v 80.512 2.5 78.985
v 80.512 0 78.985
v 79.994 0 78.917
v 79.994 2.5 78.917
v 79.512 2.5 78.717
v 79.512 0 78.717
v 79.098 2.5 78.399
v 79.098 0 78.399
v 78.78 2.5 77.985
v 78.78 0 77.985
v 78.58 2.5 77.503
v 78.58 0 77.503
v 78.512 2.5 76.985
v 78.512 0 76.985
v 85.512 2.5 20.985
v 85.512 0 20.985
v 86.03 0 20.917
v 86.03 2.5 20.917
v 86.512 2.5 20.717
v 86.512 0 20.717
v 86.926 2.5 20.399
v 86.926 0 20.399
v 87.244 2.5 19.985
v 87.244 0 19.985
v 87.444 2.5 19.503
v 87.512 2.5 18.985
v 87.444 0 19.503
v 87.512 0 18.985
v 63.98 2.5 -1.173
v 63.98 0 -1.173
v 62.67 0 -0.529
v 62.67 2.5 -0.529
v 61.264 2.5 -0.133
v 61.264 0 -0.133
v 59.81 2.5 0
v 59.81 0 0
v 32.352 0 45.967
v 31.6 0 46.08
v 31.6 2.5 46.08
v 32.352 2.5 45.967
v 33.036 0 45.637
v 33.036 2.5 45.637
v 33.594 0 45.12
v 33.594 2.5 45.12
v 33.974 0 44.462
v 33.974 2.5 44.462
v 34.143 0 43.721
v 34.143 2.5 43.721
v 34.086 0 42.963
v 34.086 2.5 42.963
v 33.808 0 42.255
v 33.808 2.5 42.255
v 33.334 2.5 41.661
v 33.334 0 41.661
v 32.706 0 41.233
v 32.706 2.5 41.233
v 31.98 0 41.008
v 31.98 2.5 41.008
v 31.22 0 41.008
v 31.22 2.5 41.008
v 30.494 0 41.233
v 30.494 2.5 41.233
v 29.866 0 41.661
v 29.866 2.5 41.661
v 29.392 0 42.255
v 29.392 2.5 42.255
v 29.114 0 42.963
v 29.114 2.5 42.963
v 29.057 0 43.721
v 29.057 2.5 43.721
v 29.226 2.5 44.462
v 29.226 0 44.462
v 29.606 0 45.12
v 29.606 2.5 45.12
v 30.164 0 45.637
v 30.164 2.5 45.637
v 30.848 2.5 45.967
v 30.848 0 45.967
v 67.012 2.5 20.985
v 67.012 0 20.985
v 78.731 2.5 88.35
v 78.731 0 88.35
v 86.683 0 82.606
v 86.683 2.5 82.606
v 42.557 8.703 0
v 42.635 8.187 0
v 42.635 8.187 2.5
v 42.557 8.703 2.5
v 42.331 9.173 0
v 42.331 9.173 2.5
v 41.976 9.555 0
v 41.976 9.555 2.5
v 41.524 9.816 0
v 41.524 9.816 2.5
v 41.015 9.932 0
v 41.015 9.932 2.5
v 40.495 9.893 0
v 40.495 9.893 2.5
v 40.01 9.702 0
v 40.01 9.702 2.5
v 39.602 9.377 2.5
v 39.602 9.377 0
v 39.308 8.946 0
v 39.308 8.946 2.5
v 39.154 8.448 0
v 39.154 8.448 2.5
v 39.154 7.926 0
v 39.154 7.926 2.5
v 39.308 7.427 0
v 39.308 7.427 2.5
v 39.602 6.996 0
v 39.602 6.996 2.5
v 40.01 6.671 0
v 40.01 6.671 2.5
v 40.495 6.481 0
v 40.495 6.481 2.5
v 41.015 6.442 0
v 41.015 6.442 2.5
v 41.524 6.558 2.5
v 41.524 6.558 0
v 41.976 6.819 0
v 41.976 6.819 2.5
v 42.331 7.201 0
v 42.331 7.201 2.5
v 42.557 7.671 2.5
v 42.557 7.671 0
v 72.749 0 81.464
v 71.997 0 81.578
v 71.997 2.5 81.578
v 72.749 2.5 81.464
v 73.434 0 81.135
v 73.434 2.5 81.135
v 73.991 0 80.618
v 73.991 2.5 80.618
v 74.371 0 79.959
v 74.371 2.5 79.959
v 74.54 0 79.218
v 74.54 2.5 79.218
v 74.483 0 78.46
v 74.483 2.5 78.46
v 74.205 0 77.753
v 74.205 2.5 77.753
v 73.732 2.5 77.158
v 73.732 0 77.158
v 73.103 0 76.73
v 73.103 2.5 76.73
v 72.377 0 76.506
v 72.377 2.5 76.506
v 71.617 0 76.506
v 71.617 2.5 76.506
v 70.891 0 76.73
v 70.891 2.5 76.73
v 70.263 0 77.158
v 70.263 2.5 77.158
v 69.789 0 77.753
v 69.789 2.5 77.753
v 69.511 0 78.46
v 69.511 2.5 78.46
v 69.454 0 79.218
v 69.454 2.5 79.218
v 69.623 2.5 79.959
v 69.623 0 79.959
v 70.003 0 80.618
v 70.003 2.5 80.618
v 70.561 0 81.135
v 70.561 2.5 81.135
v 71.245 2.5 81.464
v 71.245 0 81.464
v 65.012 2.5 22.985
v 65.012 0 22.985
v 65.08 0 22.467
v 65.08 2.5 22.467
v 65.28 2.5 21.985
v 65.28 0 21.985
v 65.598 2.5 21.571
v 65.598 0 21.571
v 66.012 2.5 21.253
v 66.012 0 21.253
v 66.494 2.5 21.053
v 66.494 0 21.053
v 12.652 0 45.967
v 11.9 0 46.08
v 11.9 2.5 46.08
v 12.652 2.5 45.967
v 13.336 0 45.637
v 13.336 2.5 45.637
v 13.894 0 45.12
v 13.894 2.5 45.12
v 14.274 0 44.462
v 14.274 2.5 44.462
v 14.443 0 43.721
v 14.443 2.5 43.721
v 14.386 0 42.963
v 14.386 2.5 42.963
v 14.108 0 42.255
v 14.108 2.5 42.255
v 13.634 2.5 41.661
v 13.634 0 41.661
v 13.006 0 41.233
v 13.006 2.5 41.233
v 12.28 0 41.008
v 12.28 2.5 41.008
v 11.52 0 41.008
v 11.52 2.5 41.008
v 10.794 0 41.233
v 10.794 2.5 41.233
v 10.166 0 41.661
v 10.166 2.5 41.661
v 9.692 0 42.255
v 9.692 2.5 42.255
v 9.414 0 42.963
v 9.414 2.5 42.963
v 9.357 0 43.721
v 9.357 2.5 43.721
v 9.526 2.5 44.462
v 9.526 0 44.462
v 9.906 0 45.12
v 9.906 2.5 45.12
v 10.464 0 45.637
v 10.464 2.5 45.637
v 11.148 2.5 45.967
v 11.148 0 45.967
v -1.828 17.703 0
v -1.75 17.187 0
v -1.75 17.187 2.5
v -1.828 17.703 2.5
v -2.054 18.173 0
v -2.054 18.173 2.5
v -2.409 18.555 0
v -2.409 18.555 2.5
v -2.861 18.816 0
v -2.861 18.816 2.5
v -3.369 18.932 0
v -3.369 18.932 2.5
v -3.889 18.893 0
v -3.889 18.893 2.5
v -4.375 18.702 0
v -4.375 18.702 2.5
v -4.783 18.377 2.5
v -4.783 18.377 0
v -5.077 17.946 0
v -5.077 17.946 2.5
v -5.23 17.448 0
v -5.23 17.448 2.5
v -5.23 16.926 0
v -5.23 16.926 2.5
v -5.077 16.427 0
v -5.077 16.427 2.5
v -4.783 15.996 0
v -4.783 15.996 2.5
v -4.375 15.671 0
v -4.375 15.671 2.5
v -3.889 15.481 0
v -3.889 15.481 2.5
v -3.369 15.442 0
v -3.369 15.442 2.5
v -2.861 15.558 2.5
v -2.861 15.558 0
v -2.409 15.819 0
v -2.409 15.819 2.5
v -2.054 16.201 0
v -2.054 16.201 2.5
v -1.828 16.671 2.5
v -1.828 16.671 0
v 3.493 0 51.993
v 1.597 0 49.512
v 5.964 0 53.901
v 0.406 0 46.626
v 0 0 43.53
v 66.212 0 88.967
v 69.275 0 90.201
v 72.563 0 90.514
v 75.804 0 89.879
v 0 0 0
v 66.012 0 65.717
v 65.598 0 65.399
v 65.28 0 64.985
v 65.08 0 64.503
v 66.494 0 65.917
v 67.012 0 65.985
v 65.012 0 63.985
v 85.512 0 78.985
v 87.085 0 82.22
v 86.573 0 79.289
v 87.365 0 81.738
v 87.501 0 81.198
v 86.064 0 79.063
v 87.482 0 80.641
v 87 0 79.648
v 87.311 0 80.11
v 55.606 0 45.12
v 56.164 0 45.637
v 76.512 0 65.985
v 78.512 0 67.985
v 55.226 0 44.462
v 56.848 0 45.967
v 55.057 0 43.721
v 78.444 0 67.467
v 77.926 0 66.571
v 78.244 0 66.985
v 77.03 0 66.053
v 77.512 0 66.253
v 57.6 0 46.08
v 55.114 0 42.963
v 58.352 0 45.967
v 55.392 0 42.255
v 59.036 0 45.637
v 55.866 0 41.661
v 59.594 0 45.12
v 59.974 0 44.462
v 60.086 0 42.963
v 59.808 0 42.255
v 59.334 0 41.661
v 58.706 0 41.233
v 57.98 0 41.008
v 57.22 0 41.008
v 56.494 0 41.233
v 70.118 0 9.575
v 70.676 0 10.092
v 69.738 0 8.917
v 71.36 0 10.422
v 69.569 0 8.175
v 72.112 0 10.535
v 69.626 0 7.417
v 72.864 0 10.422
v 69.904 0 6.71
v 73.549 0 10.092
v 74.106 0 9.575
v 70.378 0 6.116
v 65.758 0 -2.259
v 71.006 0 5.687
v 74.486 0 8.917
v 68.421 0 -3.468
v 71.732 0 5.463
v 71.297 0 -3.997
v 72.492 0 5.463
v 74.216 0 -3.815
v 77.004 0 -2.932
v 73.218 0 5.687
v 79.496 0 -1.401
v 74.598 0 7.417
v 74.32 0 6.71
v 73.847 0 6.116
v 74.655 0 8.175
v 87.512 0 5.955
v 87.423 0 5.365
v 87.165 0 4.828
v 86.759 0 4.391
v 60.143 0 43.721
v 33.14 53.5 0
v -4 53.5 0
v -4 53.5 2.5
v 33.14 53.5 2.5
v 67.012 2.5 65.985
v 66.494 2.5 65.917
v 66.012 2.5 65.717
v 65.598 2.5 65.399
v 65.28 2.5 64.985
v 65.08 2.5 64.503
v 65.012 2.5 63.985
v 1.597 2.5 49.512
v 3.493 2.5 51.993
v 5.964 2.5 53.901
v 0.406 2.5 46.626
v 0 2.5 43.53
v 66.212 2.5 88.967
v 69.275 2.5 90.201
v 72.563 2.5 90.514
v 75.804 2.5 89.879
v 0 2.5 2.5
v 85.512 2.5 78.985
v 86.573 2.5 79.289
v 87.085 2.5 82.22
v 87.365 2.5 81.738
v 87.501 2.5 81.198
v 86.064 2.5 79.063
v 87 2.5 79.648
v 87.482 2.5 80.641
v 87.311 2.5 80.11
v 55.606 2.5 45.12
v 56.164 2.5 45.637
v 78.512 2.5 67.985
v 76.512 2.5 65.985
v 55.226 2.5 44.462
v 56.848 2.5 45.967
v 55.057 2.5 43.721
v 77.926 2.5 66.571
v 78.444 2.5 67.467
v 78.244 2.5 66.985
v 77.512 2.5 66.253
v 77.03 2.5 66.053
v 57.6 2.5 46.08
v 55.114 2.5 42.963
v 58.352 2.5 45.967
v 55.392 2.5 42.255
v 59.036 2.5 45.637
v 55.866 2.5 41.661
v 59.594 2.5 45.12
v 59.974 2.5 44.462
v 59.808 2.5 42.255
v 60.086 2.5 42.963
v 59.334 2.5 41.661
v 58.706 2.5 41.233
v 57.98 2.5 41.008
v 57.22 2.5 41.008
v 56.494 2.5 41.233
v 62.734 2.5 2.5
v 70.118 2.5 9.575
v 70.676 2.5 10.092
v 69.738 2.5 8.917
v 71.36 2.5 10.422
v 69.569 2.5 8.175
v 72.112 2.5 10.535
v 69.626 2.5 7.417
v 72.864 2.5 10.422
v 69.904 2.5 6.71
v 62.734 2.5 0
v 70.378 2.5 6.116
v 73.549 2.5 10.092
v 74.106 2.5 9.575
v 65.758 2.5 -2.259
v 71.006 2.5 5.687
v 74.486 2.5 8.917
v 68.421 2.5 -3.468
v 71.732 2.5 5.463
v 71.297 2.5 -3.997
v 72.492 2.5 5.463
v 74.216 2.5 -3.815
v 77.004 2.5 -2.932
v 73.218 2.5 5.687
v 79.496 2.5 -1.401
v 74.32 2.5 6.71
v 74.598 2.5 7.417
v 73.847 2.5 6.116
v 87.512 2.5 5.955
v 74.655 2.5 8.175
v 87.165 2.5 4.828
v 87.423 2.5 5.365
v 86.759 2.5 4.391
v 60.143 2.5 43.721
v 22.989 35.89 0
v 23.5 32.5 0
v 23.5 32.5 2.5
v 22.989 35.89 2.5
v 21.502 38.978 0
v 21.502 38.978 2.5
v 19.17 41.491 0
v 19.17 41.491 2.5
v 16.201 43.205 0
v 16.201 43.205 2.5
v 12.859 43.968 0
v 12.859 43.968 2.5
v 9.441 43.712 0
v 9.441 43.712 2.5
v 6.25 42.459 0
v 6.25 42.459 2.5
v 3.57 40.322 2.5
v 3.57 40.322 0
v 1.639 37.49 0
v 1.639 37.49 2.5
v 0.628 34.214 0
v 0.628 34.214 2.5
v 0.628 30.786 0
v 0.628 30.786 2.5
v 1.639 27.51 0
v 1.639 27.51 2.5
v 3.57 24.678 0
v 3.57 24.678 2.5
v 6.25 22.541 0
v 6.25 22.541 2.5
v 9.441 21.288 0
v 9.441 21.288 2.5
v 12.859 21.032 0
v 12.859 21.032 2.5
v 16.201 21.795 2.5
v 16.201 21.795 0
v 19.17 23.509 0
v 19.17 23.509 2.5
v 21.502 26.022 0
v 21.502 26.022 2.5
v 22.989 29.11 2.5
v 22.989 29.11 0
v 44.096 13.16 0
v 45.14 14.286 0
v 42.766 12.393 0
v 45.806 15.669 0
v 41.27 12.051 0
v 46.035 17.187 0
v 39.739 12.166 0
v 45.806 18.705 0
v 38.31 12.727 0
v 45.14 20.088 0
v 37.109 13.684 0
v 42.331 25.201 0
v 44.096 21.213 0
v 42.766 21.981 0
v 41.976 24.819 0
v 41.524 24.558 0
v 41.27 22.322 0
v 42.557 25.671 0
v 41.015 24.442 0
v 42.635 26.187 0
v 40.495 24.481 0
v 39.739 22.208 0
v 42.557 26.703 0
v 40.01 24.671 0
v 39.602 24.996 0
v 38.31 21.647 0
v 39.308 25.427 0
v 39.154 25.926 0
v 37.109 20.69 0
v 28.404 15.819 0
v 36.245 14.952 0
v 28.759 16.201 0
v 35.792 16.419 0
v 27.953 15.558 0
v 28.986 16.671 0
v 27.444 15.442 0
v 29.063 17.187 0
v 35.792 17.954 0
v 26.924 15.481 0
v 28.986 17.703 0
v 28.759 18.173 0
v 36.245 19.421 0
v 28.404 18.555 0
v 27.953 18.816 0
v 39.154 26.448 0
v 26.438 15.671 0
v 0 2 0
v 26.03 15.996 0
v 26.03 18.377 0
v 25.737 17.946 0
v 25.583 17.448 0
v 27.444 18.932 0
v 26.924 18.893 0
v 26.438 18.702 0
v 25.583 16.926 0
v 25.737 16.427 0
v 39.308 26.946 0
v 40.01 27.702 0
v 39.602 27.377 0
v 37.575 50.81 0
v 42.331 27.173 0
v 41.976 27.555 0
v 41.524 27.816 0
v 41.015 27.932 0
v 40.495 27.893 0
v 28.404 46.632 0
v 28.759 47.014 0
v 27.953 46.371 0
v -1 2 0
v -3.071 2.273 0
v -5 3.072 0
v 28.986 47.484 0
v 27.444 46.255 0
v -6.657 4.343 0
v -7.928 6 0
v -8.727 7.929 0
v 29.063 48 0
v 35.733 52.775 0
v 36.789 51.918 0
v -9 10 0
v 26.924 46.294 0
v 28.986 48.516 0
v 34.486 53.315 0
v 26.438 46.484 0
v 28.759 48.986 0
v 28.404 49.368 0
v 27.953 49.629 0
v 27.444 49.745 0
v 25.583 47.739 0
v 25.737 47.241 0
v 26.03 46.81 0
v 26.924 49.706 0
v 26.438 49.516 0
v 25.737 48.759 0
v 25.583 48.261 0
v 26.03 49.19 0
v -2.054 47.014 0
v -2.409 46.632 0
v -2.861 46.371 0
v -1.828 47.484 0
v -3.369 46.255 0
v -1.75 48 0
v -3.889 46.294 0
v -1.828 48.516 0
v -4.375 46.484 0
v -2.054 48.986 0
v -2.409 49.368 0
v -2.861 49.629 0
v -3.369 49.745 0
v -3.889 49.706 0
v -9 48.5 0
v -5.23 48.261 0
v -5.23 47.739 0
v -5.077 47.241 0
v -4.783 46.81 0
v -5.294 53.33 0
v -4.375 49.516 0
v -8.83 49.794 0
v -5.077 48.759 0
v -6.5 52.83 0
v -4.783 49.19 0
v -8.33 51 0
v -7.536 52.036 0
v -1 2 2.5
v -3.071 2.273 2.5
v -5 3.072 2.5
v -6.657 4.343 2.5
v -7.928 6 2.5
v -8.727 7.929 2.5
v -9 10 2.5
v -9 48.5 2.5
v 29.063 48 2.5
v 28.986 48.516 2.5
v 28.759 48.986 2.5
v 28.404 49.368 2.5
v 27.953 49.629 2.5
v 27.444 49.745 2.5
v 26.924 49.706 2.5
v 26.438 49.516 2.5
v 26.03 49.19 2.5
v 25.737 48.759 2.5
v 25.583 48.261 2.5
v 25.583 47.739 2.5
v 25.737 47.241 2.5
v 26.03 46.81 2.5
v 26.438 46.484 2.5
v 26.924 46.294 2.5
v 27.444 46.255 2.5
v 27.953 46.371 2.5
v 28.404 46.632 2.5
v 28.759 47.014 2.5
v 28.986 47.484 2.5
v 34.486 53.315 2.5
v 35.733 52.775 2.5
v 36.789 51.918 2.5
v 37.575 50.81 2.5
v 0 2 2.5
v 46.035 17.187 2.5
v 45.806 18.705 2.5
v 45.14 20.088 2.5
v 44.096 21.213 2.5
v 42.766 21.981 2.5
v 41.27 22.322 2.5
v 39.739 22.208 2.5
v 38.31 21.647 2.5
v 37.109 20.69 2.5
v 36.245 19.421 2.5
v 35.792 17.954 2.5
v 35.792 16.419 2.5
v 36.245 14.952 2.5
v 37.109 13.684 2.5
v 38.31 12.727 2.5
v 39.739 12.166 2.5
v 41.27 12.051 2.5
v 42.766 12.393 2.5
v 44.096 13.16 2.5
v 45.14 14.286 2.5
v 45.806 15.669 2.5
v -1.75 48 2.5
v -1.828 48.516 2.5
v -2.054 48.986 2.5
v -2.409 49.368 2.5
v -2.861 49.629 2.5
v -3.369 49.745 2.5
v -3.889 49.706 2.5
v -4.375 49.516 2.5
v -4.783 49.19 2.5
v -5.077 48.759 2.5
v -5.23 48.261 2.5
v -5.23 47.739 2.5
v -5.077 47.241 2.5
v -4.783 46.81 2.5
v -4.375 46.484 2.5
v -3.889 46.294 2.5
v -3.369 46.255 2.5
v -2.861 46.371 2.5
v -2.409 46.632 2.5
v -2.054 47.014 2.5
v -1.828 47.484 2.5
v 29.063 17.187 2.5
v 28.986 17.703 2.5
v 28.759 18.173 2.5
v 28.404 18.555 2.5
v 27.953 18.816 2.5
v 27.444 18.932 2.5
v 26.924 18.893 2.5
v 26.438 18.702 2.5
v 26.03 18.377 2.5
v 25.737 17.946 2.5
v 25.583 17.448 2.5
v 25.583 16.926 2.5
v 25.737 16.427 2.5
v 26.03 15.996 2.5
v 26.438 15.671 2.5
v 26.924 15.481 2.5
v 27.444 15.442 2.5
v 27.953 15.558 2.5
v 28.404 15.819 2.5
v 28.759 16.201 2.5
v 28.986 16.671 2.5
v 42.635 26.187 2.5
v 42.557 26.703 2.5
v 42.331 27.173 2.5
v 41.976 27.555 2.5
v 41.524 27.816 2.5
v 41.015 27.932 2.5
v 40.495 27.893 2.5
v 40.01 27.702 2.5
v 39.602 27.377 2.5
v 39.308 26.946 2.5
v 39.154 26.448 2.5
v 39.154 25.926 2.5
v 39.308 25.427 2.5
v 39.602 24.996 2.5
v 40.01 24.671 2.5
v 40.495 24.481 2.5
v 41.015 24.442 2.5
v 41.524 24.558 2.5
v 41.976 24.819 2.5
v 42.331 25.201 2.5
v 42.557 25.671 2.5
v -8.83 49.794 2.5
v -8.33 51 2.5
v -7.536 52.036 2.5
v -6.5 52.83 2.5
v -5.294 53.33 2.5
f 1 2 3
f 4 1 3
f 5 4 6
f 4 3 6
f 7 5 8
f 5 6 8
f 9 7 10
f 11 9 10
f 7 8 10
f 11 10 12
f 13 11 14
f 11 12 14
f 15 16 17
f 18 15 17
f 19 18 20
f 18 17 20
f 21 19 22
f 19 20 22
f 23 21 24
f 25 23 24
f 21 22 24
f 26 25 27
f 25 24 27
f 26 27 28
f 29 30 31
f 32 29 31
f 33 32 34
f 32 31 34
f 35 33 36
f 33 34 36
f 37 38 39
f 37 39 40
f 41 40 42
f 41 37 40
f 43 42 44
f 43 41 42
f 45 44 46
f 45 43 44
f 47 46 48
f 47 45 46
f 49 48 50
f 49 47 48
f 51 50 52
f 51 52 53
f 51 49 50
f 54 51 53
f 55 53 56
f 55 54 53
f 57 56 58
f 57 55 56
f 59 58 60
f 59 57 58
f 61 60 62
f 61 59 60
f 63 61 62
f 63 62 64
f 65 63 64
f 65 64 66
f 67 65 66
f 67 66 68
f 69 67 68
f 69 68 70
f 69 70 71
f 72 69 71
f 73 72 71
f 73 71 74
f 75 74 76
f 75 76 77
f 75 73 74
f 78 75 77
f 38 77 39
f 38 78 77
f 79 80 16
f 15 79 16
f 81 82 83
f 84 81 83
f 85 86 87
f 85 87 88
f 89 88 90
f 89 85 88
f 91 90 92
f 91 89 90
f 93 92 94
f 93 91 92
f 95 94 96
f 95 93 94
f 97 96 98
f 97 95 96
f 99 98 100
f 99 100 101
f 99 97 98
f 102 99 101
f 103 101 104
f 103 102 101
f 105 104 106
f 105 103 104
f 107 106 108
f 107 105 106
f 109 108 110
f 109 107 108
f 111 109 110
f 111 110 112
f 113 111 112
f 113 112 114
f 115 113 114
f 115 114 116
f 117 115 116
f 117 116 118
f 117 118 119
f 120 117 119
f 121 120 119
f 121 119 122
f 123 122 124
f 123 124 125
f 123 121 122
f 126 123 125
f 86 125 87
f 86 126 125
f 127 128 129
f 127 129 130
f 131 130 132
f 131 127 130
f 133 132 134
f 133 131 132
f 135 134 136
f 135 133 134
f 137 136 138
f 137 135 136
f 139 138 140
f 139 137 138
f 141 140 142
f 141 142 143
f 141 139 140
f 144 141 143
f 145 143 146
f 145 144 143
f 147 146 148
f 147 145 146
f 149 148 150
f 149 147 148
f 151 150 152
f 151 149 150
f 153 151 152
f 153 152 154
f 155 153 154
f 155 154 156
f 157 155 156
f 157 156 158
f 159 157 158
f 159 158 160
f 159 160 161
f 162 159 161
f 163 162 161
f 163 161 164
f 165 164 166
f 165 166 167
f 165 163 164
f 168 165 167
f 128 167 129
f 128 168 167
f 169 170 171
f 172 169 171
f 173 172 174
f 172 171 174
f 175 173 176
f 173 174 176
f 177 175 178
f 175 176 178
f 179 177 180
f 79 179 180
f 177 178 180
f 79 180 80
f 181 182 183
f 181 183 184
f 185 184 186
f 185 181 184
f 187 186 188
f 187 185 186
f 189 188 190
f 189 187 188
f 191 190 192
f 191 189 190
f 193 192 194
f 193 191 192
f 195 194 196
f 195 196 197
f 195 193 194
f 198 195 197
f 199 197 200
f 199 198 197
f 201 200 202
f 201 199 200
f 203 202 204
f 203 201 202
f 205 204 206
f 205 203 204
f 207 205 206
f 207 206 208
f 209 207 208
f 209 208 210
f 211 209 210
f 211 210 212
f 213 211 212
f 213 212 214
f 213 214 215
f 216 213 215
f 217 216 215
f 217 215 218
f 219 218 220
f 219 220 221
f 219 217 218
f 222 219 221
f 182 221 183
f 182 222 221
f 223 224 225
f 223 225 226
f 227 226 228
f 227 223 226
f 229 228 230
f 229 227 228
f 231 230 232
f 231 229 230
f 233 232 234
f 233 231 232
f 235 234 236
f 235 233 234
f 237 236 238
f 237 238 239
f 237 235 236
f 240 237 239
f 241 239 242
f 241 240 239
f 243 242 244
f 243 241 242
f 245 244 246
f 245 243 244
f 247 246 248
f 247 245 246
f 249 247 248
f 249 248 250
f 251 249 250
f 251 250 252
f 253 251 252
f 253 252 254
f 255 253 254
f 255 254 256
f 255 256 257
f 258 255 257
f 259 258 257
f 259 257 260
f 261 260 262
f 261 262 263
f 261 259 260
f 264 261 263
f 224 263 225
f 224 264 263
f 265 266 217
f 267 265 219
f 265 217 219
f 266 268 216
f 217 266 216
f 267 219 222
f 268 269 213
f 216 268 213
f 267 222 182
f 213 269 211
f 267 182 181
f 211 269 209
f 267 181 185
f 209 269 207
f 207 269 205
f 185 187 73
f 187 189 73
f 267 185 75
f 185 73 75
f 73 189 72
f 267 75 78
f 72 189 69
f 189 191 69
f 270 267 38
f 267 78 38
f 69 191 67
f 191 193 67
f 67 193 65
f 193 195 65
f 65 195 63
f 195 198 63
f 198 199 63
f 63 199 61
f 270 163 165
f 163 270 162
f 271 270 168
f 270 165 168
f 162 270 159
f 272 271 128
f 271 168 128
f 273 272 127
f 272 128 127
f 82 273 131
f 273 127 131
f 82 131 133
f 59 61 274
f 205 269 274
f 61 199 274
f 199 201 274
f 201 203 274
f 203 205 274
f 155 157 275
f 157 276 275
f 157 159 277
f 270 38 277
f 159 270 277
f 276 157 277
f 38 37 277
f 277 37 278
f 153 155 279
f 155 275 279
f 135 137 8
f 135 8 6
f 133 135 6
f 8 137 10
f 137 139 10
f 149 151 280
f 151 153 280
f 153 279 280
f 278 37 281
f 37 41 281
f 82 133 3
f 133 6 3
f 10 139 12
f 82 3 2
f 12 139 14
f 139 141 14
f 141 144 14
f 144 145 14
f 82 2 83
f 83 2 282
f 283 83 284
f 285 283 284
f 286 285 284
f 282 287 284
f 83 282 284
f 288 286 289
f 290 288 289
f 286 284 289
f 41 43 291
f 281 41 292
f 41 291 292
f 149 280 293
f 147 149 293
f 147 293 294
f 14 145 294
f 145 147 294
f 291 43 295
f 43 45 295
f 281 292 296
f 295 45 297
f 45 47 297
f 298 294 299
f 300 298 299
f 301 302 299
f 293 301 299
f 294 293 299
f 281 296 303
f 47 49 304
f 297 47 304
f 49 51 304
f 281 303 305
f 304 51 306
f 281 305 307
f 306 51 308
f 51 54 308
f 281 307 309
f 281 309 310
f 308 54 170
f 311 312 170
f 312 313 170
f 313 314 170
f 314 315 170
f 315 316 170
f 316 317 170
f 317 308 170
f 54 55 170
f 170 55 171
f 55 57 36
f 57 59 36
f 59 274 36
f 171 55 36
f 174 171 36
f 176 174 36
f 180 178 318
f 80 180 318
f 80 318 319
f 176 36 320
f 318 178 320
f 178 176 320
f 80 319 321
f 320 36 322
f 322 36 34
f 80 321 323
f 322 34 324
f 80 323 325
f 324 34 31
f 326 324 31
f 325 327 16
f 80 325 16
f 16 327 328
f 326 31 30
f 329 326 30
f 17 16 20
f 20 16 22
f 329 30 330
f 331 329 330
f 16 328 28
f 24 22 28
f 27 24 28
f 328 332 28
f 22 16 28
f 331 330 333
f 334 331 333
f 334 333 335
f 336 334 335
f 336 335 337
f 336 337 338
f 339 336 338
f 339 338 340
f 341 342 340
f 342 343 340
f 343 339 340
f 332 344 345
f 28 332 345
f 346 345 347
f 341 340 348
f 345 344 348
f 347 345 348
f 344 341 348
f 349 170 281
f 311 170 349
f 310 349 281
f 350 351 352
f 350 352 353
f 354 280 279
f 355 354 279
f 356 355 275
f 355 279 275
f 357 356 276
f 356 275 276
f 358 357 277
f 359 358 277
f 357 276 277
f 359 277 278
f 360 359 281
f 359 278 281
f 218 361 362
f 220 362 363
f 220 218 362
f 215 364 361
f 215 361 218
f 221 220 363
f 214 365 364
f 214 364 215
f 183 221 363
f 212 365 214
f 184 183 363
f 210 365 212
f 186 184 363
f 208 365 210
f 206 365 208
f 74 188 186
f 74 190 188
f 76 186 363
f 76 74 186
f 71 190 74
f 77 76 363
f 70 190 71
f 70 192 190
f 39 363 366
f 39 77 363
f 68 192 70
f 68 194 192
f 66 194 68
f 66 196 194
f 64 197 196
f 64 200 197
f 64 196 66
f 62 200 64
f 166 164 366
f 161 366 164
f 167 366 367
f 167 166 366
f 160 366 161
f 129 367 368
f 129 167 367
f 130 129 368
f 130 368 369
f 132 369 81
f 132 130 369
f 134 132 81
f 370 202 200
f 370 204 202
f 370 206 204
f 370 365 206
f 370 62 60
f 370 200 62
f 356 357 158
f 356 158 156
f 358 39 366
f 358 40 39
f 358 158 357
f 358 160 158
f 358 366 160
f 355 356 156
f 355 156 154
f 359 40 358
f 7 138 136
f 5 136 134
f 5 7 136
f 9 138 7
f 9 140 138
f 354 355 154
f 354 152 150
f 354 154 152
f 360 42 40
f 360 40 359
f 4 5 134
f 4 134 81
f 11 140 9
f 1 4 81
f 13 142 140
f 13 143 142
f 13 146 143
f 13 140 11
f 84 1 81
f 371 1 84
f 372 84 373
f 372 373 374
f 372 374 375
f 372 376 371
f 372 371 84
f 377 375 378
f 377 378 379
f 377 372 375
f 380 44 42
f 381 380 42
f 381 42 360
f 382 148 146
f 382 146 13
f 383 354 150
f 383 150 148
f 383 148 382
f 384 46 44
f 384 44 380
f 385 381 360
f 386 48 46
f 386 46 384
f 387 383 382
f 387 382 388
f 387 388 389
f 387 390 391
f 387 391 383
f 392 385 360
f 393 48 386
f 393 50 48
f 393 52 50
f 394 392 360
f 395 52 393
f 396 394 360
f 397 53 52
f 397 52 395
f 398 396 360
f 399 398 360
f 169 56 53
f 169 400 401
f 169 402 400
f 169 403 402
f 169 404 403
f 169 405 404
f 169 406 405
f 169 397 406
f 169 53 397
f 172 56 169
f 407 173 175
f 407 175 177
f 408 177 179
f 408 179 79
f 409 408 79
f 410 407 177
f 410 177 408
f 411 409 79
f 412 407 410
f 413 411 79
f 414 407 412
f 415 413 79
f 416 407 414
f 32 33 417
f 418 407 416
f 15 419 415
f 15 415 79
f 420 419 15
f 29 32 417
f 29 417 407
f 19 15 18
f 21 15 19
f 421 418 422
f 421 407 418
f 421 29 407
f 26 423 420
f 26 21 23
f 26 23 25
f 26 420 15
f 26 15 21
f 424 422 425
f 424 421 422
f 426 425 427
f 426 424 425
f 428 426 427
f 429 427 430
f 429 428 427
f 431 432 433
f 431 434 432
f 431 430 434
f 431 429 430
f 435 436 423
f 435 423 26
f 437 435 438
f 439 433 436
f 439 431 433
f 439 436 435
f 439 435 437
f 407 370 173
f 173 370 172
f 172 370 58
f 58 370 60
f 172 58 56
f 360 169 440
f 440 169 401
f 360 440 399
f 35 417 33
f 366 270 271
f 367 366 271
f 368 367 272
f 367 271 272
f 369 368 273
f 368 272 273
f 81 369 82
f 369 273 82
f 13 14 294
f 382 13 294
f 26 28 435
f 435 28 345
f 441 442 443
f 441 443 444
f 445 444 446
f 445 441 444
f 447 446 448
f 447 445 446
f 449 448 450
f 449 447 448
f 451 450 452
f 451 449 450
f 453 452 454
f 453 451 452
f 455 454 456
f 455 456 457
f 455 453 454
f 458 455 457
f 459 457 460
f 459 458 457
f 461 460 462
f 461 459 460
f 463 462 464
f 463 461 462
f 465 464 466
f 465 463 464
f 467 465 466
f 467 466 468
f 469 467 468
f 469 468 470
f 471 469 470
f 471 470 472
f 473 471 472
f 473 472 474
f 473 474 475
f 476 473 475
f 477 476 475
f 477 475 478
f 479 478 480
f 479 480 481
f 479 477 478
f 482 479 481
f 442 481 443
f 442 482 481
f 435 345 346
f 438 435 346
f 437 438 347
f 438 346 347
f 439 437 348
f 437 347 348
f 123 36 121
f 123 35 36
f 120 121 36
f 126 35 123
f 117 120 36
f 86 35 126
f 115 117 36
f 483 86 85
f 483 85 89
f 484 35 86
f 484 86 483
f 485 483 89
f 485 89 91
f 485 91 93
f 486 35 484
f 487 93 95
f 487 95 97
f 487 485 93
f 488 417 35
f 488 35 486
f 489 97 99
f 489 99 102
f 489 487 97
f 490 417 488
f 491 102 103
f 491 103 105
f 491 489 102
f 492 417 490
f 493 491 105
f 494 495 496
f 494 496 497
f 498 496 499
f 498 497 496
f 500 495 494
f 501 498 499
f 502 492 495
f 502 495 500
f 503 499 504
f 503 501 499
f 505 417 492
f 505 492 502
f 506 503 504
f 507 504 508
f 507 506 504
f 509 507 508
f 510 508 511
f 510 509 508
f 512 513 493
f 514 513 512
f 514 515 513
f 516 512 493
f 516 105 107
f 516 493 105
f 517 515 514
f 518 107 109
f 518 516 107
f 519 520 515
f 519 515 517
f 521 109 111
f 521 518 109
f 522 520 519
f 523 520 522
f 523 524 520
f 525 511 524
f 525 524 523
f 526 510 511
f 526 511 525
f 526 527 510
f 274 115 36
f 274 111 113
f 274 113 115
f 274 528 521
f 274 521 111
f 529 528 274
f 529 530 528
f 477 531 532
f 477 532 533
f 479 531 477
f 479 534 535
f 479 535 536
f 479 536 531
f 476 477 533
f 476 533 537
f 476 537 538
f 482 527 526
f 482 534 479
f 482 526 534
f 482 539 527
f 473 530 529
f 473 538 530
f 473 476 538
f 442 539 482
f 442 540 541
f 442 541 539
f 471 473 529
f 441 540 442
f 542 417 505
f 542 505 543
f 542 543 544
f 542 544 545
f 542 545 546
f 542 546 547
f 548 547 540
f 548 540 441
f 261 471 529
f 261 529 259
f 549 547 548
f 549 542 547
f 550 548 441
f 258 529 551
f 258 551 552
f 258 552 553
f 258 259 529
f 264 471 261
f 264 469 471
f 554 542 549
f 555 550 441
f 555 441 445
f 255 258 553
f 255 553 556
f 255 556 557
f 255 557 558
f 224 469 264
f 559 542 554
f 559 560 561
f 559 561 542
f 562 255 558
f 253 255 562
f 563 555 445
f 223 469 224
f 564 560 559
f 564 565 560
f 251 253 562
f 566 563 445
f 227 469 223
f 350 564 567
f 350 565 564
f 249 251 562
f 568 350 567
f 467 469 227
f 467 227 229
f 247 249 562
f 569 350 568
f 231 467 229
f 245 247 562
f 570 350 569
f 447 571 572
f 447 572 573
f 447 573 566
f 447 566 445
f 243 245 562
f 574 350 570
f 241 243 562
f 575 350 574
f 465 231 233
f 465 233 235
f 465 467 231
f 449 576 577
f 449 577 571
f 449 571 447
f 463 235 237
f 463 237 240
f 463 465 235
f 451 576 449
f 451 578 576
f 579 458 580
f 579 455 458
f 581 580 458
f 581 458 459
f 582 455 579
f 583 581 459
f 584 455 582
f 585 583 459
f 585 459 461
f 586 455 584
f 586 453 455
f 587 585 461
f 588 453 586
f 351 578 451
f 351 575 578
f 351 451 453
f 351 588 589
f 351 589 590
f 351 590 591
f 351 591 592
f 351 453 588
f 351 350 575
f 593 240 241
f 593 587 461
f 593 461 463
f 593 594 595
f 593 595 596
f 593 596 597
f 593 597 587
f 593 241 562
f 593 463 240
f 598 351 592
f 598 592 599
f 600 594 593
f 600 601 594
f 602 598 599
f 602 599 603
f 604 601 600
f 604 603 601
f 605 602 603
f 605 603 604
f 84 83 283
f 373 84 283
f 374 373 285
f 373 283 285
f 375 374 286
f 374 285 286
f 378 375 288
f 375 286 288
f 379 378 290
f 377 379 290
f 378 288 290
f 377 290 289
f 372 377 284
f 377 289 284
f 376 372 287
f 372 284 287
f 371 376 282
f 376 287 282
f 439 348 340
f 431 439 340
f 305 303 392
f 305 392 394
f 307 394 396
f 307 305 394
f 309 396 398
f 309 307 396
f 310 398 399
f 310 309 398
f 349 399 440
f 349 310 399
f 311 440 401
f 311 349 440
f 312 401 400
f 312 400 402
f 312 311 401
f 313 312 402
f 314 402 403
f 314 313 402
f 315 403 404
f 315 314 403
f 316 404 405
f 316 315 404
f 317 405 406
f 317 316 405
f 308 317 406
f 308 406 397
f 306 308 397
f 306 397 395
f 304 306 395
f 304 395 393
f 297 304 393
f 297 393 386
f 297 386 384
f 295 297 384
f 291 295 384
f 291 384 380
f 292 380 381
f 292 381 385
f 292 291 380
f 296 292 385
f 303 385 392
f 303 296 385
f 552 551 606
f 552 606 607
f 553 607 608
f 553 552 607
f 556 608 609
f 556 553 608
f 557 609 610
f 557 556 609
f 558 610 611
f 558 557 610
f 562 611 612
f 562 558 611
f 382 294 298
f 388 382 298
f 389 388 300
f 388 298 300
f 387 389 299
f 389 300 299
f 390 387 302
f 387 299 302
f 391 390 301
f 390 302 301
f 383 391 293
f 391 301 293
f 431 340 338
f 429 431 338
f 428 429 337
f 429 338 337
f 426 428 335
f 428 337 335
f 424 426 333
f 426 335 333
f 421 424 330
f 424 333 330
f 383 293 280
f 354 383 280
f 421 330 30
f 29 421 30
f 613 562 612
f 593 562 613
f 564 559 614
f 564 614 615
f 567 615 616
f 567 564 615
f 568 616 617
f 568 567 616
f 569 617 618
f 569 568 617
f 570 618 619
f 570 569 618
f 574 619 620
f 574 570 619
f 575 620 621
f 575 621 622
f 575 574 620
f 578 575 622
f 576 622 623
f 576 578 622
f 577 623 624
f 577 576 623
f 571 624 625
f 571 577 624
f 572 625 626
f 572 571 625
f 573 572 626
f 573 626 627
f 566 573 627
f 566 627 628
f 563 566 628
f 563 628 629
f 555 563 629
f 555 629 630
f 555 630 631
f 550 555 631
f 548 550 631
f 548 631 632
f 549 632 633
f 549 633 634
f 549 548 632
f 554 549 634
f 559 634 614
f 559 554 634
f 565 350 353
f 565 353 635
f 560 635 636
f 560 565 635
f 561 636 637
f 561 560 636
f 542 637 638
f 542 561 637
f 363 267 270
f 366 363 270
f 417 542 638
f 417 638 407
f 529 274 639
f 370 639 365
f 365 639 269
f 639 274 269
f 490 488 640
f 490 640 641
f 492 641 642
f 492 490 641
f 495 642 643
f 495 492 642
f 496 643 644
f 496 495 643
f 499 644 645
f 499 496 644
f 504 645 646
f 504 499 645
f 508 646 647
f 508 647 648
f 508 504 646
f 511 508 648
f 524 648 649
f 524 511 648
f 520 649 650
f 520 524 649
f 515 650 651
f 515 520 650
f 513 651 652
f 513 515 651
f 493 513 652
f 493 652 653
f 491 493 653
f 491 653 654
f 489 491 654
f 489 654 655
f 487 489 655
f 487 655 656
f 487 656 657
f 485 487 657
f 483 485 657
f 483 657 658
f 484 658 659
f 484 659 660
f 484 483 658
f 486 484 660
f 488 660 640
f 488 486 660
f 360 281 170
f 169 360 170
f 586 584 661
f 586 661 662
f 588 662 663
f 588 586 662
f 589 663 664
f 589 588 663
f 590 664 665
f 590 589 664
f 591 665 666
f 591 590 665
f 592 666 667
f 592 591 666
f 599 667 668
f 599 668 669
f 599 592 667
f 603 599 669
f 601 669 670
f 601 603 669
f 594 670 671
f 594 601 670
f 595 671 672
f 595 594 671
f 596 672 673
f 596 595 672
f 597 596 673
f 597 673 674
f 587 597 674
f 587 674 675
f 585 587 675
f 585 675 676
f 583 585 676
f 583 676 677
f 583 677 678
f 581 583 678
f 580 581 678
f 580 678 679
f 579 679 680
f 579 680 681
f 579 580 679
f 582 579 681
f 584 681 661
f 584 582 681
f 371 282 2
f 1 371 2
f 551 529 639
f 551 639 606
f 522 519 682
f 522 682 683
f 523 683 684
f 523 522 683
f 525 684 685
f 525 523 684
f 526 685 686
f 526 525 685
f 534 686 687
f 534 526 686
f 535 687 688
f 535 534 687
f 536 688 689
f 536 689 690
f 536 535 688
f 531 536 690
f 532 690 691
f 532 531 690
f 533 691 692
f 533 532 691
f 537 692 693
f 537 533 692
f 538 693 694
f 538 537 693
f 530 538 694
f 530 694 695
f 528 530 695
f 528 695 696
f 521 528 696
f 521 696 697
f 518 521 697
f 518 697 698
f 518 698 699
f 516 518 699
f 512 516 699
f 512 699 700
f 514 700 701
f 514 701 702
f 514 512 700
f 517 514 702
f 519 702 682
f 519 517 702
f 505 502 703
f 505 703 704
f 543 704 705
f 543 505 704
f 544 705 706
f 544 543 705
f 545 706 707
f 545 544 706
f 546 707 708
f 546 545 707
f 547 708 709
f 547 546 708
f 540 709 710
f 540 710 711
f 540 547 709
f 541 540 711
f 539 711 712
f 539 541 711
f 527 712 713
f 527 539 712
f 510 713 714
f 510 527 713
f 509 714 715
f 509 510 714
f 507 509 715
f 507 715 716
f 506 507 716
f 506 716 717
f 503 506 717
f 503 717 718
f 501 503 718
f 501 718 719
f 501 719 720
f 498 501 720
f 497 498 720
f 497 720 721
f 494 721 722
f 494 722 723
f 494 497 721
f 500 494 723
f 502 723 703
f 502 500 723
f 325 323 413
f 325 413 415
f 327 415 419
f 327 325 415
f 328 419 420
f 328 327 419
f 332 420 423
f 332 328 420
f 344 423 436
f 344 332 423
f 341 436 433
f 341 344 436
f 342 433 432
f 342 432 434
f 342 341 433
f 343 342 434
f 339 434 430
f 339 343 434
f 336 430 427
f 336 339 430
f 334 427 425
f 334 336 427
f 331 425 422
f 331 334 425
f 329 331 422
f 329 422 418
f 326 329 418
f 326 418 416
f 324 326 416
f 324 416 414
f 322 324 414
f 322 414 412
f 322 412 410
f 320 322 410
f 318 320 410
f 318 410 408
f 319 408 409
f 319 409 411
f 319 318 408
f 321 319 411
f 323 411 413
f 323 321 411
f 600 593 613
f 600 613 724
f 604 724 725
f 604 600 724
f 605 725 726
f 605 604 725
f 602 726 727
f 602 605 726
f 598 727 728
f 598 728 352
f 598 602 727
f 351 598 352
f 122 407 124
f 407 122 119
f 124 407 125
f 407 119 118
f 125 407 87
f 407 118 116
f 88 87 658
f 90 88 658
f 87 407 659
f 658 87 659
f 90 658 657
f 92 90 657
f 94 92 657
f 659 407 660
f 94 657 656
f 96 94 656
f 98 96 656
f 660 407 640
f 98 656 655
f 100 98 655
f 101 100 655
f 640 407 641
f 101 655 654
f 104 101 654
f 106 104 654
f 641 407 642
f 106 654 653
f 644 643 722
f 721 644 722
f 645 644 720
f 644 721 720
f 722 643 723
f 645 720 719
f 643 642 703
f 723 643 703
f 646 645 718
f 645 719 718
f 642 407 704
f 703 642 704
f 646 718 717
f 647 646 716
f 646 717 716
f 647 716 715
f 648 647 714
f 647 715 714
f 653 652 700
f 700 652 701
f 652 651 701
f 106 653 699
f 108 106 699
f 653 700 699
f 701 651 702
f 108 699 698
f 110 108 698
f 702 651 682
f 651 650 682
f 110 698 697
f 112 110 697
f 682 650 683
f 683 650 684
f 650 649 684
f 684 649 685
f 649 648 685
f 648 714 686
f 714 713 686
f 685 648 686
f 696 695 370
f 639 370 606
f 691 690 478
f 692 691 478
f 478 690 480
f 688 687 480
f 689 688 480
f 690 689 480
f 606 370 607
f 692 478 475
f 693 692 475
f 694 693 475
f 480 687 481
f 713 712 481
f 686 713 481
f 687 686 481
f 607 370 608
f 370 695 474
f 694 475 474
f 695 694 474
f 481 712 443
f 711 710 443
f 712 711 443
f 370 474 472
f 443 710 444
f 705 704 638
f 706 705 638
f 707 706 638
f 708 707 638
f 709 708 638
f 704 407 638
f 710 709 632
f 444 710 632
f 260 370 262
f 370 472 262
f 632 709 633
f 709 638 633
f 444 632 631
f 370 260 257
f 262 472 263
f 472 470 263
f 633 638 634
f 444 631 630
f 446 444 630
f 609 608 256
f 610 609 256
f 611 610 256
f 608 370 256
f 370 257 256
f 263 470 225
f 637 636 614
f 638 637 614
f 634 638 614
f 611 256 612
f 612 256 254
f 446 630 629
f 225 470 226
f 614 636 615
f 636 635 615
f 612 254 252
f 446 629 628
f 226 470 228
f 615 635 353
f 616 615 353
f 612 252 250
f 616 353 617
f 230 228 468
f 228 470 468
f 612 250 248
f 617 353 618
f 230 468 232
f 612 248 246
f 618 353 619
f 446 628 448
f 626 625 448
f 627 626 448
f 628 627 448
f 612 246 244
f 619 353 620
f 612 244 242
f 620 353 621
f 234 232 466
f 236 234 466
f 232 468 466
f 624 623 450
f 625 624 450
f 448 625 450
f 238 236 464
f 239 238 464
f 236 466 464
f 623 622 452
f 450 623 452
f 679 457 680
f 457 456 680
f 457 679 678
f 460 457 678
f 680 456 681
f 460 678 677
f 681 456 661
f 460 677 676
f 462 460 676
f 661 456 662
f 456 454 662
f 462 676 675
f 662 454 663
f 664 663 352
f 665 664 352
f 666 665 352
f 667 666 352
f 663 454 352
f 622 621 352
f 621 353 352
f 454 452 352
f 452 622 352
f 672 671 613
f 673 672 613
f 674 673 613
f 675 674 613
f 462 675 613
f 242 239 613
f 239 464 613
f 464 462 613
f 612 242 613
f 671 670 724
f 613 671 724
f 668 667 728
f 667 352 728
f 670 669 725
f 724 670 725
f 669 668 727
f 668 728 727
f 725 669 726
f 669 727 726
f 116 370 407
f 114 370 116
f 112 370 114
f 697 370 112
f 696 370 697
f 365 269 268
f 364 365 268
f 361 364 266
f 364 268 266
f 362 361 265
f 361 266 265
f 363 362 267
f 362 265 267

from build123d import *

# Parameters (mm, degrees)
SKETCH2_R           = 2.55
BOSS_EXTRUDE1_DEPTH = 2.5
SKETCH3_R           = 11.5
SKETCH3_R_2         = 5.15
SKETCH3_R_3         = 1.75
BOSS_EXTRUDE2_DEPTH = 2.5


with BuildPart() as part:
    # Sketch2 → Boss-Extrude1 (new body)
    with BuildSketch(Plane(origin=(0, 0, 0), x_dir=(1, 0, 0), z_dir=(0, 1, 0))):
        with BuildLine():
            Line((0, 0), (0, -43.53))
            ThreePointArc((0, -43.53), (1.597239013, -49.511852877), (5.96376064, -53.901297623))
            Line((5.96376064, -53.901297623), (66.212357085, -88.966818103))
            ThreePointArc((66.212357085, -88.966818103), (72.562868254, -90.513731665), (78.730609731, -88.350193185))
            Line((78.730609731, -88.350193185), (86.683137673, -82.606205082))
            ThreePointArc((86.683137673, -82.606205082), (87.415064266, -80.369517058), (85.51209015, -78.984894595))
            Line((85.51209015, -78.984894595), (80.51209015, -78.984894595))
            ThreePointArc((80.51209015, -78.984894595), (79.097876588, -78.399108157), (78.51209015, -76.984894595))
            Line((78.51209015, -76.984894595), (78.51209015, -67.984894595))
            ThreePointArc((78.51209015, -67.984894595), (77.926303712, -66.570681032), (76.51209015, -65.984894595))
            Line((76.51209015, -65.984894595), (67.01209015, -65.984894595))
            ThreePointArc((67.01209015, -65.984894595), (65.597876588, -65.399108157), (65.01209015, -63.984894595))
            Line((65.01209015, -63.984894595), (65.01209015, -22.984894595))
            ThreePointArc((65.01209015, -22.984894595), (65.597876588, -21.570681032), (67.01209015, -20.984894595))
            Line((67.01209015, -20.984894595), (85.51209015, -20.984894595))
            ThreePointArc((85.51209015, -20.984894595), (86.926303712, -20.399108157), (87.51209015, -18.984894595))
            Line((87.51209015, -18.984894595), (87.51209015, -5.954894595))
            ThreePointArc((87.51209015, -5.954894595), (87.314017067, -5.087104652), (86.759030766, -4.391200539))
            Line((86.759030766, -4.391200539), (79.495671877, 1.400838623))
            ThreePointArc((79.495671877, 1.400838623), (72.762340359, 3.995319432), (65.758425997, 2.25915481))
            Line((65.758425997, 2.25915481), (63.980401456, 1.173012986))
            ThreePointArc((63.980401456, 1.173012986), (61.97611448, 0.29883463), (59.81, 0))
            Line((59.81, 0), (0, 0))
        make_face()
        with Locations(Location((71.997086471, -79.027657881, 0), (0, 0, 270))):
            Circle(SKETCH2_R, mode=Mode.SUBTRACT)
        with Locations(Location((11.9, -43.53, 0), (0, 0, 270))):
            Circle(SKETCH2_R, mode=Mode.SUBTRACT)
        with Locations(Location((31.6, -43.53, 0), (0, 0, 270))):
            Circle(SKETCH2_R, mode=Mode.SUBTRACT)
        with Locations(Location((57.6, -43.53, 0), (0, 0, 270))):
            Circle(SKETCH2_R, mode=Mode.SUBTRACT)
        with Locations(Location((72.11209015, -7.984894595, 0), (0, 0, 270))):
            Circle(SKETCH2_R, mode=Mode.SUBTRACT)
    extrude(amount=BOSS_EXTRUDE1_DEPTH)

    # Sketch3 → Boss-Extrude2 (add)
    with BuildSketch(Plane.XY):
        with BuildLine():
            Line((0, 2), (-1, 2))
            ThreePointArc((-1, 2), (-6.656854249, 4.343145751), (-9, 10))
            Line((-9, 10), (-9, 48.5))
            ThreePointArc((-9, 48.5), (-7.535533906, 52.035533906), (-4, 53.5))
            Line((-4, 53.5), (8.545082445, 53.5))
            Line((8.545082445, 53.5), (17.116766662, 53.5))
            Line((17.116766662, 53.5), (33.14, 53.5))
            ThreePointArc((33.14, 53.5), (35.733493255, 52.774785695), (37.574651147, 50.809517094))
            Line((37.574651147, 50.809517094), (62.964663137, 2.056534888))
            Line((62.964663137, 2.056534888), (0, 2))
        make_face()
        with Locations((12, 32.5)):
            Circle(SKETCH3_R, mode=Mode.SUBTRACT)
        with Locations((40.884663137, 17.186715743)):
            Circle(SKETCH3_R_2, mode=Mode.SUBTRACT)
        with Locations((40.884663137, 26.186715743)):
            Circle(SKETCH3_R_3, mode=Mode.SUBTRACT)
        with Locations((40.884663137, 8.186715743)):
            Circle(SKETCH3_R_3, mode=Mode.SUBTRACT)
        with Locations((-3.5, 48)):
            Circle(SKETCH3_R_3, mode=Mode.SUBTRACT)
        with Locations((27.313284257, 48)):
            Circle(SKETCH3_R_3, mode=Mode.SUBTRACT)
        with Locations((27.313284257, 17.186715743)):
            Circle(SKETCH3_R_3, mode=Mode.SUBTRACT)
        with Locations((-3.5, 17.186715743)):
            Circle(SKETCH3_R_3, mode=Mode.SUBTRACT)
    extrude(amount=BOSS_EXTRUDE2_DEPTH)


solid = part.part
